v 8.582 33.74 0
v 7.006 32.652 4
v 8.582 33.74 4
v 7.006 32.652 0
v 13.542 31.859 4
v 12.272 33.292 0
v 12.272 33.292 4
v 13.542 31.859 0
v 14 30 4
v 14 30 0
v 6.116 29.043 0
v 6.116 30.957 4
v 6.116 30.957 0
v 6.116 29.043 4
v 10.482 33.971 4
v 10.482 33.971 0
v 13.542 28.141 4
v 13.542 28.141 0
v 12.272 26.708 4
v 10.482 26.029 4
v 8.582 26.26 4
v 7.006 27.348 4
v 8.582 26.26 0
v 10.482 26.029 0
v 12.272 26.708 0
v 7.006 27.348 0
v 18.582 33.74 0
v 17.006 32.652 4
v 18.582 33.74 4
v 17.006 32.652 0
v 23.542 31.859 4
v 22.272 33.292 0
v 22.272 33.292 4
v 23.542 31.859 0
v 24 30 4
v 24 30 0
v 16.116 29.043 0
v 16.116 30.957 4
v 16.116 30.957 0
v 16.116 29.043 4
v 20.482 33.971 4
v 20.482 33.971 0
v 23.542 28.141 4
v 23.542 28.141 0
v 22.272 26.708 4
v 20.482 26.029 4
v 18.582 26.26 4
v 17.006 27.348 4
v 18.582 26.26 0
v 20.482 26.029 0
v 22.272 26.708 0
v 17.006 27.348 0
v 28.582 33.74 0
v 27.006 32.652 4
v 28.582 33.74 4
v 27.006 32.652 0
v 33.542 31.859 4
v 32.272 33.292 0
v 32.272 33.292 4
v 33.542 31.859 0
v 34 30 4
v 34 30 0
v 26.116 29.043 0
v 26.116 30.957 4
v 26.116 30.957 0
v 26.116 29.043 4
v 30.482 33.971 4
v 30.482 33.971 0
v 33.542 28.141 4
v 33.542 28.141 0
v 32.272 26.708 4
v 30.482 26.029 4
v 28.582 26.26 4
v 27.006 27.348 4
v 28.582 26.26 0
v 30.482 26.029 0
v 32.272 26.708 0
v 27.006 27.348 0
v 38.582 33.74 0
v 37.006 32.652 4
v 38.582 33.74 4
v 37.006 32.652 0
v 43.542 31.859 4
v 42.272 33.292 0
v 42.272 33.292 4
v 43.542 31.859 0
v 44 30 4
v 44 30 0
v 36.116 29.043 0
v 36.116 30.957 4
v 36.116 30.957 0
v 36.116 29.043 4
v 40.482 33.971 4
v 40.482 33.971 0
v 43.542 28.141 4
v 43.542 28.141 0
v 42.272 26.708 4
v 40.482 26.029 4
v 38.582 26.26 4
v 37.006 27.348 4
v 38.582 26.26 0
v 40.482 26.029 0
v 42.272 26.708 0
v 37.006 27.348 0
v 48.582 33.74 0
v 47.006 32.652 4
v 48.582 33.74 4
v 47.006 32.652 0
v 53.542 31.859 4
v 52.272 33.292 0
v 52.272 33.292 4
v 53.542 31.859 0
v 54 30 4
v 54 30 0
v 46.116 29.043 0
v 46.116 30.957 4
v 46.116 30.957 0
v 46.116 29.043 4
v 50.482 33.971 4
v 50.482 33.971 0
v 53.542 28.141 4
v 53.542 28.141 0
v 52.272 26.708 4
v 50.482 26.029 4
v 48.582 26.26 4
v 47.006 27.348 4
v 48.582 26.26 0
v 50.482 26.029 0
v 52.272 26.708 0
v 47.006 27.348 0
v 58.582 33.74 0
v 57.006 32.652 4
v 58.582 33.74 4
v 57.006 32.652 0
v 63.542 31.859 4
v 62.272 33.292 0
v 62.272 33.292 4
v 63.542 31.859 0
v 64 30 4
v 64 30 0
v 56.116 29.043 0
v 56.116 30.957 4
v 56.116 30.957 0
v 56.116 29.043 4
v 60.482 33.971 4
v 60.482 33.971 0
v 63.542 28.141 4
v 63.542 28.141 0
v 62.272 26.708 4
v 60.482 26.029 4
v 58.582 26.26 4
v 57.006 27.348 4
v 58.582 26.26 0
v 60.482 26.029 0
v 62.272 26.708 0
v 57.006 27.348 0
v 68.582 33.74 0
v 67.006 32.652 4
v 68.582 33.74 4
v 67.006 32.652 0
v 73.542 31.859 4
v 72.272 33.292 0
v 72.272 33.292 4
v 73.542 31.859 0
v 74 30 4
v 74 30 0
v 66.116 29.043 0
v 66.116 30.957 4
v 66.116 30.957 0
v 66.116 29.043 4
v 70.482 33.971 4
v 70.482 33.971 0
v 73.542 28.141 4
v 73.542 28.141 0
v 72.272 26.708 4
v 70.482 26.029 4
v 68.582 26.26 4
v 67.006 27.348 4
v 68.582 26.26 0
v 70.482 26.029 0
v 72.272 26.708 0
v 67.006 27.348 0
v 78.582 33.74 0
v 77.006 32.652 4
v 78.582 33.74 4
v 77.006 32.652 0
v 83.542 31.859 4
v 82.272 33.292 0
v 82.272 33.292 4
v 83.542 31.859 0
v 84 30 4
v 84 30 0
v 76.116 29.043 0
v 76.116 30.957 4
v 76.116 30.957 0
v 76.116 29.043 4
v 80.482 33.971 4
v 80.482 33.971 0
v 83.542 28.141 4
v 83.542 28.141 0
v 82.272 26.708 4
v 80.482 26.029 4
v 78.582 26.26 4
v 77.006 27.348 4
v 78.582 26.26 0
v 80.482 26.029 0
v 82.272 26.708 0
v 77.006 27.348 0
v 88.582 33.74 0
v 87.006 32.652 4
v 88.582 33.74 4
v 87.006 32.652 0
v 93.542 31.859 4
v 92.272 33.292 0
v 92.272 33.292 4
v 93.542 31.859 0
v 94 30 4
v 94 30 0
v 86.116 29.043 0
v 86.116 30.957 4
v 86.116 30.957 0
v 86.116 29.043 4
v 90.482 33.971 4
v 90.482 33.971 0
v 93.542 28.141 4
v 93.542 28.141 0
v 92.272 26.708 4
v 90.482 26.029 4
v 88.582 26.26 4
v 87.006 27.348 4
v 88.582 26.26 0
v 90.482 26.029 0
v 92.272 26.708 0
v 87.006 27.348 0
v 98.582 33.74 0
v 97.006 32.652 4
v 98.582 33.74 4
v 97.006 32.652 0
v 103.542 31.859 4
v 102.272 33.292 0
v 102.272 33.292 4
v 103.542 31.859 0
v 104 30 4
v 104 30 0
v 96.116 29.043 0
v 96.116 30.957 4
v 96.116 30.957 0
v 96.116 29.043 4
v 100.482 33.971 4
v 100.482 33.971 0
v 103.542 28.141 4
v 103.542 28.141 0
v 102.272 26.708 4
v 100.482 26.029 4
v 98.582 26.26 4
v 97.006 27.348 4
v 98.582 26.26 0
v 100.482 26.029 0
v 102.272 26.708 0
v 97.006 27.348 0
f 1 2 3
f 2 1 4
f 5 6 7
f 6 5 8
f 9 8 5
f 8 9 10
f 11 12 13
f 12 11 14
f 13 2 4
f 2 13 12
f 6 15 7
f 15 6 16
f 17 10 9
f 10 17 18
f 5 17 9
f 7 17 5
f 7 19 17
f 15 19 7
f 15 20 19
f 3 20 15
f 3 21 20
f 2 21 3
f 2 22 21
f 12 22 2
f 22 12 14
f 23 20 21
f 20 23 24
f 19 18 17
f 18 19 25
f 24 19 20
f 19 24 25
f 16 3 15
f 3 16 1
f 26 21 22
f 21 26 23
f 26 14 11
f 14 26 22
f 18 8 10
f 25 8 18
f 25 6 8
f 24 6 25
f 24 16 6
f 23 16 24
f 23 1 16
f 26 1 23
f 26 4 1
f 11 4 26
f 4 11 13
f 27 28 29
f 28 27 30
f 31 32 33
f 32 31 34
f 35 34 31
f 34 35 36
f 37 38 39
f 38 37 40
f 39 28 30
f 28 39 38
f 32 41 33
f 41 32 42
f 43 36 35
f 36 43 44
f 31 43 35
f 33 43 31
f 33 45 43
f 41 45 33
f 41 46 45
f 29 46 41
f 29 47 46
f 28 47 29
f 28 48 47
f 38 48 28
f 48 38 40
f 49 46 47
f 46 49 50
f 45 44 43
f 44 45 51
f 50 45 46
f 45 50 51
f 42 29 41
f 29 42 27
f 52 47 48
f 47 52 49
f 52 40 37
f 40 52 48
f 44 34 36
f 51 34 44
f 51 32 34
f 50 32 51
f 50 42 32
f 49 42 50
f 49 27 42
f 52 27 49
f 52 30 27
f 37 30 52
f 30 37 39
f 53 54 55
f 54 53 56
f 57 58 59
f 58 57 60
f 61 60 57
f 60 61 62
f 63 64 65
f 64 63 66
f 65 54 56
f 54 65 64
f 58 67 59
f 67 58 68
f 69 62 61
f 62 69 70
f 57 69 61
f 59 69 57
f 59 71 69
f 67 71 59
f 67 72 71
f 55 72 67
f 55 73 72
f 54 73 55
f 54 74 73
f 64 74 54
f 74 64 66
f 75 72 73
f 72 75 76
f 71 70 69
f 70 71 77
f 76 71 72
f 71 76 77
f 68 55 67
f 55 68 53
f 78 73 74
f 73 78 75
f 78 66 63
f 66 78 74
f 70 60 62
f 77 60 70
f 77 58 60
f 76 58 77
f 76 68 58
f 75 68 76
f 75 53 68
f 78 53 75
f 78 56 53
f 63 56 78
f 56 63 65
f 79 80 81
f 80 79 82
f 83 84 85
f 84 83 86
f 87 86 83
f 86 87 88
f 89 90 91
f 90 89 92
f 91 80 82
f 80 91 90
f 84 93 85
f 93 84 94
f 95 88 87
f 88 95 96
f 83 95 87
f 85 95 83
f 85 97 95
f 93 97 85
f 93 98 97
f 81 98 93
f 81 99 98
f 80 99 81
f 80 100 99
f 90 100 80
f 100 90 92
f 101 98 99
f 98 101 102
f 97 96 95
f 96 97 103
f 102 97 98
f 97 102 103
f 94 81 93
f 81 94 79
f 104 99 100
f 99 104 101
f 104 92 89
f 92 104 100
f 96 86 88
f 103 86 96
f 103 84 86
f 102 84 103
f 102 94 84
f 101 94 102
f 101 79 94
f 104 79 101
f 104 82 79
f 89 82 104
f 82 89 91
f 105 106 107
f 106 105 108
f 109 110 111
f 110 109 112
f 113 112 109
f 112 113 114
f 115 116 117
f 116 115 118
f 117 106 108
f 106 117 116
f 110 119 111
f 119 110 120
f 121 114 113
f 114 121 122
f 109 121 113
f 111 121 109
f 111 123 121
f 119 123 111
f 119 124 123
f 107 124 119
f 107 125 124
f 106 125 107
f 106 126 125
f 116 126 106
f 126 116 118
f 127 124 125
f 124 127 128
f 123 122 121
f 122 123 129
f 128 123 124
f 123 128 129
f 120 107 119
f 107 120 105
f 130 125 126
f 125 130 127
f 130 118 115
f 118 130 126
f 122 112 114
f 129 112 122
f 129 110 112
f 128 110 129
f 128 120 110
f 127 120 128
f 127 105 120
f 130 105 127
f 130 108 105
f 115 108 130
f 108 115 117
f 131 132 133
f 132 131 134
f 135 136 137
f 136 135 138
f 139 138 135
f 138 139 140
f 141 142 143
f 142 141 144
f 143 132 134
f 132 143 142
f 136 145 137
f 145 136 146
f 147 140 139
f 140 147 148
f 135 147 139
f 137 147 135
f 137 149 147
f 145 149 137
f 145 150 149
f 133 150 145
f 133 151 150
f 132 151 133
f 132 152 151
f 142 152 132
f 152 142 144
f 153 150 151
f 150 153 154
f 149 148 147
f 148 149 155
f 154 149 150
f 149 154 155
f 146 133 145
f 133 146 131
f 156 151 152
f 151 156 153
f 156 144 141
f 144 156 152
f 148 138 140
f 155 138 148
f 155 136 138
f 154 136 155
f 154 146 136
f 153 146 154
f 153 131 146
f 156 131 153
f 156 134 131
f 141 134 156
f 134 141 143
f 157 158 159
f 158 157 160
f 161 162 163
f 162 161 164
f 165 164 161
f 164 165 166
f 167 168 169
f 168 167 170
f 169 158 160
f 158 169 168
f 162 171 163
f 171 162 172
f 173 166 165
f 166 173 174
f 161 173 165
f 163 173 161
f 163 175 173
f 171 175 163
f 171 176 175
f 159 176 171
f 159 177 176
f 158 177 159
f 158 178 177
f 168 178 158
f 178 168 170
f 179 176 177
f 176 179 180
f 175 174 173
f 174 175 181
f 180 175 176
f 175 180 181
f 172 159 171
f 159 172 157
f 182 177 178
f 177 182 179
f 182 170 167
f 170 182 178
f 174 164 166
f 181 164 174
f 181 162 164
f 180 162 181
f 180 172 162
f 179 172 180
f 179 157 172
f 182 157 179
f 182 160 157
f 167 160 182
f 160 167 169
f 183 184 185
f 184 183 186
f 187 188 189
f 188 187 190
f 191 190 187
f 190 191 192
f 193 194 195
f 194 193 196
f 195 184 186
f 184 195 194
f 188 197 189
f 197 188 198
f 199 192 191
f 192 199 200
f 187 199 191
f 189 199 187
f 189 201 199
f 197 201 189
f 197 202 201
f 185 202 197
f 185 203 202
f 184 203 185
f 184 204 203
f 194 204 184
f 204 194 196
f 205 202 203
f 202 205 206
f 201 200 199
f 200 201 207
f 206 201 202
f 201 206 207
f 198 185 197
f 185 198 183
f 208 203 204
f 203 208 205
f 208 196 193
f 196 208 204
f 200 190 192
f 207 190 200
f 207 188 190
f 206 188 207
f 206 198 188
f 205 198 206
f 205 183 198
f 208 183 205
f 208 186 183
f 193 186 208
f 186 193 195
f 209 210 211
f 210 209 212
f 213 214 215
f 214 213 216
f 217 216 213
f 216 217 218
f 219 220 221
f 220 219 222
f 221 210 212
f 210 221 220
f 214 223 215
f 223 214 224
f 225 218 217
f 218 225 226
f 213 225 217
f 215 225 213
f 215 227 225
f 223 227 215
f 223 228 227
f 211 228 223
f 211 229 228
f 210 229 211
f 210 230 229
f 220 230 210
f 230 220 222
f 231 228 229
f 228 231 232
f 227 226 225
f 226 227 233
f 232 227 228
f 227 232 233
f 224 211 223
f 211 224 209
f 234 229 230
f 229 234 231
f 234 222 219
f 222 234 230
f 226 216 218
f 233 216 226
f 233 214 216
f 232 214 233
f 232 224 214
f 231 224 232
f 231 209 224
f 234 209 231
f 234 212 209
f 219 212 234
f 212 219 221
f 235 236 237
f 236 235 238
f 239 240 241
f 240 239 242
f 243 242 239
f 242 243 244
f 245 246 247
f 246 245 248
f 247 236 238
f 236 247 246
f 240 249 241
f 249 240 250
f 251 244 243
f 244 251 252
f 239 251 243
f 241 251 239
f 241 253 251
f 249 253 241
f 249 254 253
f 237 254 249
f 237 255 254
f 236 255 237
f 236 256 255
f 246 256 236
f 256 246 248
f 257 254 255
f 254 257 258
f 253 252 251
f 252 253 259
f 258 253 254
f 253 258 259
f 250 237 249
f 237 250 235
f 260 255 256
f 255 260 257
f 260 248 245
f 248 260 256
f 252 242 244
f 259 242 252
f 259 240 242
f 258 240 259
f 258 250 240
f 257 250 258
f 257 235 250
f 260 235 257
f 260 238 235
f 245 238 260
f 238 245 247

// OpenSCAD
for (x_position = [10:10:100]) {
    translate([x_position, 30, 0]) cylinder(h=4, r1=4, r2=4); 
}
